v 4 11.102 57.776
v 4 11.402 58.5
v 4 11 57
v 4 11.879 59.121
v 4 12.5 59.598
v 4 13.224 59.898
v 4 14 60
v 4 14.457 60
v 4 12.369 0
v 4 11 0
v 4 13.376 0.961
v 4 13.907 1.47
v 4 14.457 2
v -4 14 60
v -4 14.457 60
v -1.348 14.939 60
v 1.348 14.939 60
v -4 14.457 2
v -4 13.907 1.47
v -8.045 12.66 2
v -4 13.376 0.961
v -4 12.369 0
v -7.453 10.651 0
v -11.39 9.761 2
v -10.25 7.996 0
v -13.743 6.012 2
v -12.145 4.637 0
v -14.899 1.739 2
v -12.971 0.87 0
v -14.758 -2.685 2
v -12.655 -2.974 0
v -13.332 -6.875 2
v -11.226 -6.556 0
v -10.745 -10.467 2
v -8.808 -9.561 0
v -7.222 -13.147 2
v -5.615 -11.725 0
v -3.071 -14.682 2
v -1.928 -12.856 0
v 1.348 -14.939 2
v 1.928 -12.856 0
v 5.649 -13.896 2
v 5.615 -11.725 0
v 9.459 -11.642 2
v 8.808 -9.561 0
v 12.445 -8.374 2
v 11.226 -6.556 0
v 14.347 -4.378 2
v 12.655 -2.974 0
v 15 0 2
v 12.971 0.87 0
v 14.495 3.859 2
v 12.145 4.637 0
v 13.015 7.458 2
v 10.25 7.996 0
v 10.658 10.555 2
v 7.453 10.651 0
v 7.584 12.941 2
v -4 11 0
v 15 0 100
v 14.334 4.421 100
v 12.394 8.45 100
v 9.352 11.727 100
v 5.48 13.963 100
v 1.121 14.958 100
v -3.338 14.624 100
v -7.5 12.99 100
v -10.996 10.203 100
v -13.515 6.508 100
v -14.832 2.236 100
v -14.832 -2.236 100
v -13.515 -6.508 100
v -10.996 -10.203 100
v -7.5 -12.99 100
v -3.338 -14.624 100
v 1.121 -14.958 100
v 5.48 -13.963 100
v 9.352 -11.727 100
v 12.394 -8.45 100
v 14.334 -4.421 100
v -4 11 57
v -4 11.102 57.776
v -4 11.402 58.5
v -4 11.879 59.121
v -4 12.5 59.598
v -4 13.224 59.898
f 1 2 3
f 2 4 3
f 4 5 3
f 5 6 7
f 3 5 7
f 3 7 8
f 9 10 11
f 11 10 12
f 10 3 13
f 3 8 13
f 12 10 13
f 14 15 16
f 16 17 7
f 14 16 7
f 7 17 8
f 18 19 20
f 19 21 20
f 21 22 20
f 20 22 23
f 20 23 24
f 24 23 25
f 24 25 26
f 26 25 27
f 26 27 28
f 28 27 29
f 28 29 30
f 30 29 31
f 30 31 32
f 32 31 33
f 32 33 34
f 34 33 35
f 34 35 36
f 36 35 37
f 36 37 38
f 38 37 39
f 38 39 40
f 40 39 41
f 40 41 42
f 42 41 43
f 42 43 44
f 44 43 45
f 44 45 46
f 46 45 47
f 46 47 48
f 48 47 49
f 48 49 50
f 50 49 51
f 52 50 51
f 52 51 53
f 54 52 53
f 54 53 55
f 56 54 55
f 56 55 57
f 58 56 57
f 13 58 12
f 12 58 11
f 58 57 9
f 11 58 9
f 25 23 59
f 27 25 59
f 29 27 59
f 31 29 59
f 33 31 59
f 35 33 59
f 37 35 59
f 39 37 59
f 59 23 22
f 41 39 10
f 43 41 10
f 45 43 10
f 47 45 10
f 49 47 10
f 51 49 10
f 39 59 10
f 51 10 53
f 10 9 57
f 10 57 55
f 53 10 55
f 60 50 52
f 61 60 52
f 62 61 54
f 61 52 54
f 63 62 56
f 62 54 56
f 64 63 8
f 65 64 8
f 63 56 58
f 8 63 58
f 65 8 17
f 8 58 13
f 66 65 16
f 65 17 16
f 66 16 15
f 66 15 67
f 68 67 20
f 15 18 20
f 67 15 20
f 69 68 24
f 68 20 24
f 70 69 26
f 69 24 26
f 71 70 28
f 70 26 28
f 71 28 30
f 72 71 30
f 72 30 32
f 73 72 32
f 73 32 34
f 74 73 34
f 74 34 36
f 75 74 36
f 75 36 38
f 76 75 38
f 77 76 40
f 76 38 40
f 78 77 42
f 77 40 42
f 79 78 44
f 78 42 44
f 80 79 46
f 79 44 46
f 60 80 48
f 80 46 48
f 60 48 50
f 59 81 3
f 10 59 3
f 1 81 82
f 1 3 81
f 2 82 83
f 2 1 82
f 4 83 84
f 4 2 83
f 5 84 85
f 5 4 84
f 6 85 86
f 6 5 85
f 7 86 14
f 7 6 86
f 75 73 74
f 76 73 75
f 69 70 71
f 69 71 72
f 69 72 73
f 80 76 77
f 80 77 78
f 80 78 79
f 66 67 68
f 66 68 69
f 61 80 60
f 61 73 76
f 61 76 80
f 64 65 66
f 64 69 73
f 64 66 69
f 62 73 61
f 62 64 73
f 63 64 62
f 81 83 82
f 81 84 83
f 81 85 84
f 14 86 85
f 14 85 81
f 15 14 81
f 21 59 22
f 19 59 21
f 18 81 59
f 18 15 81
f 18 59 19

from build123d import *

# Parameters (mm, degrees)
SKETCH1_R           = 15
BOSS_EXTRUDE1_DEPTH = 100
CHAMFER1_SIZE       = 2
SKETCH3_W           = 8
SKETCH3_H           = 60
CUT_EXTRUDE1_DEPTH  = 4
FILLET1_R           = 3


with BuildPart() as part:
    # Sketch1 → Boss-Extrude1 (new body)
    with BuildSketch(Plane.XY):
        Circle(SKETCH1_R)
    extrude(amount=BOSS_EXTRUDE1_DEPTH)

    # Chamfer1
    chamfer1_edges = [part.edges().sort_by_distance(p)[0] for p in [
        (-15, 0, 0),
    ]]
    chamfer(chamfer1_edges, length=CHAMFER1_SIZE)

    # Sketch3 → Cut-Extrude1 (cut)
    with BuildSketch(Plane(origin=(0, 15, 100), x_dir=(1, 0, 0), z_dir=(0, 1, 0))):
        with Locations((0, 70)):
            Rectangle(SKETCH3_W, SKETCH3_H)
    extrude(amount=-CUT_EXTRUDE1_DEPTH, mode=Mode.SUBTRACT)

    # Fillet1
    fillet1_edges = [part.edges().sort_by_distance(p)[0] for p in [
        (0, 11, 60),
    ]]
    fillet(fillet1_edges, radius=FILLET1_R)


solid = part.part
